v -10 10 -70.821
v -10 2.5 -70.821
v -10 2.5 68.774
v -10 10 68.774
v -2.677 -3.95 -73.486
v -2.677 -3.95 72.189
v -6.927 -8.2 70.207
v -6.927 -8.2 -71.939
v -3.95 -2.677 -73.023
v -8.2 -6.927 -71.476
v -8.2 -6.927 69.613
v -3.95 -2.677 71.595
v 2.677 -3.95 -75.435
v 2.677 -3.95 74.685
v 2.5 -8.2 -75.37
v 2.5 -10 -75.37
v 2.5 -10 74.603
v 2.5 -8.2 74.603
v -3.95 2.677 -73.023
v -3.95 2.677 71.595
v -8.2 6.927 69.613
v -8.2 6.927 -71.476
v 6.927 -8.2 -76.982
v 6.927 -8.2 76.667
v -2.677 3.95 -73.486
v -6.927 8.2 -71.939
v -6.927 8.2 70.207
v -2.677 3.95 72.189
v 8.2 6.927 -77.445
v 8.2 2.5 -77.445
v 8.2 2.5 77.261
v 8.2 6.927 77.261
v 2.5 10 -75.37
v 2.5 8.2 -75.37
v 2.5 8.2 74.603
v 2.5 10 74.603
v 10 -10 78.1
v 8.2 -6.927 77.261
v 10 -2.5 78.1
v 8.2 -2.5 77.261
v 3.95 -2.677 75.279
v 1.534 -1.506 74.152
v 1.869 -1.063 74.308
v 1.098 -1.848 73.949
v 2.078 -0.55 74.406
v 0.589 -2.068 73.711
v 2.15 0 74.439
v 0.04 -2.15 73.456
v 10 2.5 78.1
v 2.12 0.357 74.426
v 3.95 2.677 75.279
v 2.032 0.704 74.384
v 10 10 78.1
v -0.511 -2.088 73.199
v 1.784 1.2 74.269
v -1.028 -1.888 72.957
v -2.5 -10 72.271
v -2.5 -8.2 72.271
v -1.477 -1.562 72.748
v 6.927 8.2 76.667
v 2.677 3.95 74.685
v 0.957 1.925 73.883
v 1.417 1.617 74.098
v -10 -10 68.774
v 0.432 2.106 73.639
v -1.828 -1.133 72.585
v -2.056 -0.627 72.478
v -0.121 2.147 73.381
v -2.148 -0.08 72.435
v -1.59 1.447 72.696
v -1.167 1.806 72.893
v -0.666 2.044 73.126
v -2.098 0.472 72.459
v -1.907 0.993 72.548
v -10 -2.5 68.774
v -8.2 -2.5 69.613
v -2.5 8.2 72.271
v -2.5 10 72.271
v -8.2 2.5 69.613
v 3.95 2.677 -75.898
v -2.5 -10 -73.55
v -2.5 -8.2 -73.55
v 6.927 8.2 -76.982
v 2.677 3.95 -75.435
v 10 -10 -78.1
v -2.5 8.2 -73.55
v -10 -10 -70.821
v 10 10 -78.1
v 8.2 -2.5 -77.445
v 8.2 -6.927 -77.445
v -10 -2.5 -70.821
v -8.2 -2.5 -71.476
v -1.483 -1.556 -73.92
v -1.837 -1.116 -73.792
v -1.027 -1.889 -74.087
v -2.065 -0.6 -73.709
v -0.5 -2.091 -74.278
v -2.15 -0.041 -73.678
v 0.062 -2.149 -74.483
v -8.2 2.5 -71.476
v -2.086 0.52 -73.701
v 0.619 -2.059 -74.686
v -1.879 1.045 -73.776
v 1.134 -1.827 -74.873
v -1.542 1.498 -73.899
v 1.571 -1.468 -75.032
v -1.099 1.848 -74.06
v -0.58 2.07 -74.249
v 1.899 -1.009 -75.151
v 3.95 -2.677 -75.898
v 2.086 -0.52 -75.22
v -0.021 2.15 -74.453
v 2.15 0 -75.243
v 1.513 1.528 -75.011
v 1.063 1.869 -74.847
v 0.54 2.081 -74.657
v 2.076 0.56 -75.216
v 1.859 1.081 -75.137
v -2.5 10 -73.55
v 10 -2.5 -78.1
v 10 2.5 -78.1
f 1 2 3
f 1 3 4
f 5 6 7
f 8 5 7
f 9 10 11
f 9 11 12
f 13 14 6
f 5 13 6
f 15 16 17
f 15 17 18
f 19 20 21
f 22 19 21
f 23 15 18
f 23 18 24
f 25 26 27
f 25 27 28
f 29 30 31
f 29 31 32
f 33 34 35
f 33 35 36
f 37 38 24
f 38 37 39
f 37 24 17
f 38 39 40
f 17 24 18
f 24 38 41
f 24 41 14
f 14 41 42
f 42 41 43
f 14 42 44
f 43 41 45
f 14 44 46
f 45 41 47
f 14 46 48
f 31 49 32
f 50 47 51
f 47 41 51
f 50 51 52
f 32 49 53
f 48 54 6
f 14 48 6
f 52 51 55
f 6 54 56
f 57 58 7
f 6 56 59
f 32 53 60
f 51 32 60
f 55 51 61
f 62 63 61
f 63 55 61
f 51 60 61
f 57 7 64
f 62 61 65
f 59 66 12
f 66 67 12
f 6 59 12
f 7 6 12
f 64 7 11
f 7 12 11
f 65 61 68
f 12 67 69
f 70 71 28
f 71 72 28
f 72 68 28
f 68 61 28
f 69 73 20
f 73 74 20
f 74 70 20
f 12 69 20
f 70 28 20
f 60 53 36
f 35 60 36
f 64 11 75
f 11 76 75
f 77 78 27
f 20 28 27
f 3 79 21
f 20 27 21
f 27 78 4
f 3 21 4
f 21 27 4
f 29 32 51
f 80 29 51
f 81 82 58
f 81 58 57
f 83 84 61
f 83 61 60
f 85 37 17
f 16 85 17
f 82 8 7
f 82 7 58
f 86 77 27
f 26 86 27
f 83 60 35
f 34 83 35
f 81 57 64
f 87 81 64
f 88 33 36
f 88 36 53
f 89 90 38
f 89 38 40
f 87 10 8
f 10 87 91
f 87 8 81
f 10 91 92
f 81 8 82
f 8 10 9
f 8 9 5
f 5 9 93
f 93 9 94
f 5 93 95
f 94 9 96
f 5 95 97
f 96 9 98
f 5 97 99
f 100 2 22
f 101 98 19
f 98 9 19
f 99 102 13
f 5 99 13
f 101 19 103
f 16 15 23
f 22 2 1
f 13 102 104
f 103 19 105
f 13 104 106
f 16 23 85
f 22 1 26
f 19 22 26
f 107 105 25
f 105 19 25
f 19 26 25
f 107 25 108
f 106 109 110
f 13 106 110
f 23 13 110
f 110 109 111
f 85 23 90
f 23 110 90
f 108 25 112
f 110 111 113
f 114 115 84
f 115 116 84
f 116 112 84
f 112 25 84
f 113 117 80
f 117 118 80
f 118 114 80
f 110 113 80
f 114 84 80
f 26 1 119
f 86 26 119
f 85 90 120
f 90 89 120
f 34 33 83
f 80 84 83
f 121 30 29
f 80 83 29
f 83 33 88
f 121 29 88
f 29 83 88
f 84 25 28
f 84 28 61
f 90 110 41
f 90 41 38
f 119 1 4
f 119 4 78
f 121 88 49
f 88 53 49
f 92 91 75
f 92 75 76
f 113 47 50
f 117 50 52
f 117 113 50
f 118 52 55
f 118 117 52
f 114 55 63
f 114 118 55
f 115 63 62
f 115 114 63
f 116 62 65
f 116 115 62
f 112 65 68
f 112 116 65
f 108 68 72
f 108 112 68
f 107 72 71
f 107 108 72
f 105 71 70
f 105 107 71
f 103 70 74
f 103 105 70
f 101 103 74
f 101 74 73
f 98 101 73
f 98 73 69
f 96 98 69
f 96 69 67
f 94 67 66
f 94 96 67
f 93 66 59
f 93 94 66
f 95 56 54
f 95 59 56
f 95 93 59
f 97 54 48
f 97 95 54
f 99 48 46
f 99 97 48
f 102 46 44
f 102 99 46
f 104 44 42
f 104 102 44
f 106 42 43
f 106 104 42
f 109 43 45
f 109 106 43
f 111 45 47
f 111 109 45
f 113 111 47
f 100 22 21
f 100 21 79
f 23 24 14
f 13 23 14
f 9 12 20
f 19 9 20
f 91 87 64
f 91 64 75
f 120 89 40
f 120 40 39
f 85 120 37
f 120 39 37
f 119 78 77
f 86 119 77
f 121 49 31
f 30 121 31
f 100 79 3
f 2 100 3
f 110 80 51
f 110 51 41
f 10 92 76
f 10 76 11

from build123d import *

# Parameters (mm, degrees)
SKETCH2_R           = 2.15
BOSS_EXTRUDE1_DEPTH = 78.1
CUT_EXTRUDE1_DEPTH  = 21
CUT_EXTRUDE2_DEPTH  = 21


with BuildPart() as part:
    # Sketch2 → Boss-Extrude1 (new body, symmetric)
    with BuildSketch(Plane.XY):
        Polygon((-2.5, 10), (-2.5, 8.2), (-6.927207794, 8.2), (-2.677207794, 3.95), (2.677207794, 3.95), (6.927207794, 8.2), (2.5, 8.2), (2.5, 10), (10, 10), (10, 2.5), (8.2, 2.5), (8.2, 6.927207794), (3.95, 2.677207794), (3.95, -2.677207794), (8.2, -6.927207794), (8.2, -2.5), (10, -2.5), (10, -10), (2.5, -10), (2.5, -8.2), (6.927207794, -8.2), (2.677207794, -3.95), (-2.677207794, -3.95), (-6.927207794, -8.2), (-2.5, -8.2), (-2.5, -10), (-10, -10), (-10, -2.5), (-8.2, -2.5), (-8.2, -6.927207794), (-3.95, -2.677207794), (-3.95, 2.677207794), (-8.2, 6.927207794), (-8.2, 2.5), (-10, 2.5), (-10, 10), align=None)
        Circle(SKETCH2_R, mode=Mode.SUBTRACT)
    extrude(amount=BOSS_EXTRUDE1_DEPTH, both=True)

    # Sketch3 → Cut-Extrude1 (cut, through all)
    with BuildSketch(Plane(origin=(0, 10, 0), x_dir=(1, 0, 0), z_dir=(0, 1, 0))):
        Polygon((-10, -78.1), (10, -78.1), (-10, -68.773846837), align=None)
    extrude(amount=-CUT_EXTRUDE1_DEPTH, mode=Mode.SUBTRACT)

    # Sketch4 → Cut-Extrude2 (cut, through all)
    with BuildSketch(Plane(origin=(0, 10, 0), x_dir=(1, 0, 0), z_dir=(0, 1, 0))):
        Polygon((10, 78.1), (-10, 78.1), (-10, 70.820595315), align=None)
    extrude(amount=-CUT_EXTRUDE2_DEPTH, mode=Mode.SUBTRACT)


solid = part.part
